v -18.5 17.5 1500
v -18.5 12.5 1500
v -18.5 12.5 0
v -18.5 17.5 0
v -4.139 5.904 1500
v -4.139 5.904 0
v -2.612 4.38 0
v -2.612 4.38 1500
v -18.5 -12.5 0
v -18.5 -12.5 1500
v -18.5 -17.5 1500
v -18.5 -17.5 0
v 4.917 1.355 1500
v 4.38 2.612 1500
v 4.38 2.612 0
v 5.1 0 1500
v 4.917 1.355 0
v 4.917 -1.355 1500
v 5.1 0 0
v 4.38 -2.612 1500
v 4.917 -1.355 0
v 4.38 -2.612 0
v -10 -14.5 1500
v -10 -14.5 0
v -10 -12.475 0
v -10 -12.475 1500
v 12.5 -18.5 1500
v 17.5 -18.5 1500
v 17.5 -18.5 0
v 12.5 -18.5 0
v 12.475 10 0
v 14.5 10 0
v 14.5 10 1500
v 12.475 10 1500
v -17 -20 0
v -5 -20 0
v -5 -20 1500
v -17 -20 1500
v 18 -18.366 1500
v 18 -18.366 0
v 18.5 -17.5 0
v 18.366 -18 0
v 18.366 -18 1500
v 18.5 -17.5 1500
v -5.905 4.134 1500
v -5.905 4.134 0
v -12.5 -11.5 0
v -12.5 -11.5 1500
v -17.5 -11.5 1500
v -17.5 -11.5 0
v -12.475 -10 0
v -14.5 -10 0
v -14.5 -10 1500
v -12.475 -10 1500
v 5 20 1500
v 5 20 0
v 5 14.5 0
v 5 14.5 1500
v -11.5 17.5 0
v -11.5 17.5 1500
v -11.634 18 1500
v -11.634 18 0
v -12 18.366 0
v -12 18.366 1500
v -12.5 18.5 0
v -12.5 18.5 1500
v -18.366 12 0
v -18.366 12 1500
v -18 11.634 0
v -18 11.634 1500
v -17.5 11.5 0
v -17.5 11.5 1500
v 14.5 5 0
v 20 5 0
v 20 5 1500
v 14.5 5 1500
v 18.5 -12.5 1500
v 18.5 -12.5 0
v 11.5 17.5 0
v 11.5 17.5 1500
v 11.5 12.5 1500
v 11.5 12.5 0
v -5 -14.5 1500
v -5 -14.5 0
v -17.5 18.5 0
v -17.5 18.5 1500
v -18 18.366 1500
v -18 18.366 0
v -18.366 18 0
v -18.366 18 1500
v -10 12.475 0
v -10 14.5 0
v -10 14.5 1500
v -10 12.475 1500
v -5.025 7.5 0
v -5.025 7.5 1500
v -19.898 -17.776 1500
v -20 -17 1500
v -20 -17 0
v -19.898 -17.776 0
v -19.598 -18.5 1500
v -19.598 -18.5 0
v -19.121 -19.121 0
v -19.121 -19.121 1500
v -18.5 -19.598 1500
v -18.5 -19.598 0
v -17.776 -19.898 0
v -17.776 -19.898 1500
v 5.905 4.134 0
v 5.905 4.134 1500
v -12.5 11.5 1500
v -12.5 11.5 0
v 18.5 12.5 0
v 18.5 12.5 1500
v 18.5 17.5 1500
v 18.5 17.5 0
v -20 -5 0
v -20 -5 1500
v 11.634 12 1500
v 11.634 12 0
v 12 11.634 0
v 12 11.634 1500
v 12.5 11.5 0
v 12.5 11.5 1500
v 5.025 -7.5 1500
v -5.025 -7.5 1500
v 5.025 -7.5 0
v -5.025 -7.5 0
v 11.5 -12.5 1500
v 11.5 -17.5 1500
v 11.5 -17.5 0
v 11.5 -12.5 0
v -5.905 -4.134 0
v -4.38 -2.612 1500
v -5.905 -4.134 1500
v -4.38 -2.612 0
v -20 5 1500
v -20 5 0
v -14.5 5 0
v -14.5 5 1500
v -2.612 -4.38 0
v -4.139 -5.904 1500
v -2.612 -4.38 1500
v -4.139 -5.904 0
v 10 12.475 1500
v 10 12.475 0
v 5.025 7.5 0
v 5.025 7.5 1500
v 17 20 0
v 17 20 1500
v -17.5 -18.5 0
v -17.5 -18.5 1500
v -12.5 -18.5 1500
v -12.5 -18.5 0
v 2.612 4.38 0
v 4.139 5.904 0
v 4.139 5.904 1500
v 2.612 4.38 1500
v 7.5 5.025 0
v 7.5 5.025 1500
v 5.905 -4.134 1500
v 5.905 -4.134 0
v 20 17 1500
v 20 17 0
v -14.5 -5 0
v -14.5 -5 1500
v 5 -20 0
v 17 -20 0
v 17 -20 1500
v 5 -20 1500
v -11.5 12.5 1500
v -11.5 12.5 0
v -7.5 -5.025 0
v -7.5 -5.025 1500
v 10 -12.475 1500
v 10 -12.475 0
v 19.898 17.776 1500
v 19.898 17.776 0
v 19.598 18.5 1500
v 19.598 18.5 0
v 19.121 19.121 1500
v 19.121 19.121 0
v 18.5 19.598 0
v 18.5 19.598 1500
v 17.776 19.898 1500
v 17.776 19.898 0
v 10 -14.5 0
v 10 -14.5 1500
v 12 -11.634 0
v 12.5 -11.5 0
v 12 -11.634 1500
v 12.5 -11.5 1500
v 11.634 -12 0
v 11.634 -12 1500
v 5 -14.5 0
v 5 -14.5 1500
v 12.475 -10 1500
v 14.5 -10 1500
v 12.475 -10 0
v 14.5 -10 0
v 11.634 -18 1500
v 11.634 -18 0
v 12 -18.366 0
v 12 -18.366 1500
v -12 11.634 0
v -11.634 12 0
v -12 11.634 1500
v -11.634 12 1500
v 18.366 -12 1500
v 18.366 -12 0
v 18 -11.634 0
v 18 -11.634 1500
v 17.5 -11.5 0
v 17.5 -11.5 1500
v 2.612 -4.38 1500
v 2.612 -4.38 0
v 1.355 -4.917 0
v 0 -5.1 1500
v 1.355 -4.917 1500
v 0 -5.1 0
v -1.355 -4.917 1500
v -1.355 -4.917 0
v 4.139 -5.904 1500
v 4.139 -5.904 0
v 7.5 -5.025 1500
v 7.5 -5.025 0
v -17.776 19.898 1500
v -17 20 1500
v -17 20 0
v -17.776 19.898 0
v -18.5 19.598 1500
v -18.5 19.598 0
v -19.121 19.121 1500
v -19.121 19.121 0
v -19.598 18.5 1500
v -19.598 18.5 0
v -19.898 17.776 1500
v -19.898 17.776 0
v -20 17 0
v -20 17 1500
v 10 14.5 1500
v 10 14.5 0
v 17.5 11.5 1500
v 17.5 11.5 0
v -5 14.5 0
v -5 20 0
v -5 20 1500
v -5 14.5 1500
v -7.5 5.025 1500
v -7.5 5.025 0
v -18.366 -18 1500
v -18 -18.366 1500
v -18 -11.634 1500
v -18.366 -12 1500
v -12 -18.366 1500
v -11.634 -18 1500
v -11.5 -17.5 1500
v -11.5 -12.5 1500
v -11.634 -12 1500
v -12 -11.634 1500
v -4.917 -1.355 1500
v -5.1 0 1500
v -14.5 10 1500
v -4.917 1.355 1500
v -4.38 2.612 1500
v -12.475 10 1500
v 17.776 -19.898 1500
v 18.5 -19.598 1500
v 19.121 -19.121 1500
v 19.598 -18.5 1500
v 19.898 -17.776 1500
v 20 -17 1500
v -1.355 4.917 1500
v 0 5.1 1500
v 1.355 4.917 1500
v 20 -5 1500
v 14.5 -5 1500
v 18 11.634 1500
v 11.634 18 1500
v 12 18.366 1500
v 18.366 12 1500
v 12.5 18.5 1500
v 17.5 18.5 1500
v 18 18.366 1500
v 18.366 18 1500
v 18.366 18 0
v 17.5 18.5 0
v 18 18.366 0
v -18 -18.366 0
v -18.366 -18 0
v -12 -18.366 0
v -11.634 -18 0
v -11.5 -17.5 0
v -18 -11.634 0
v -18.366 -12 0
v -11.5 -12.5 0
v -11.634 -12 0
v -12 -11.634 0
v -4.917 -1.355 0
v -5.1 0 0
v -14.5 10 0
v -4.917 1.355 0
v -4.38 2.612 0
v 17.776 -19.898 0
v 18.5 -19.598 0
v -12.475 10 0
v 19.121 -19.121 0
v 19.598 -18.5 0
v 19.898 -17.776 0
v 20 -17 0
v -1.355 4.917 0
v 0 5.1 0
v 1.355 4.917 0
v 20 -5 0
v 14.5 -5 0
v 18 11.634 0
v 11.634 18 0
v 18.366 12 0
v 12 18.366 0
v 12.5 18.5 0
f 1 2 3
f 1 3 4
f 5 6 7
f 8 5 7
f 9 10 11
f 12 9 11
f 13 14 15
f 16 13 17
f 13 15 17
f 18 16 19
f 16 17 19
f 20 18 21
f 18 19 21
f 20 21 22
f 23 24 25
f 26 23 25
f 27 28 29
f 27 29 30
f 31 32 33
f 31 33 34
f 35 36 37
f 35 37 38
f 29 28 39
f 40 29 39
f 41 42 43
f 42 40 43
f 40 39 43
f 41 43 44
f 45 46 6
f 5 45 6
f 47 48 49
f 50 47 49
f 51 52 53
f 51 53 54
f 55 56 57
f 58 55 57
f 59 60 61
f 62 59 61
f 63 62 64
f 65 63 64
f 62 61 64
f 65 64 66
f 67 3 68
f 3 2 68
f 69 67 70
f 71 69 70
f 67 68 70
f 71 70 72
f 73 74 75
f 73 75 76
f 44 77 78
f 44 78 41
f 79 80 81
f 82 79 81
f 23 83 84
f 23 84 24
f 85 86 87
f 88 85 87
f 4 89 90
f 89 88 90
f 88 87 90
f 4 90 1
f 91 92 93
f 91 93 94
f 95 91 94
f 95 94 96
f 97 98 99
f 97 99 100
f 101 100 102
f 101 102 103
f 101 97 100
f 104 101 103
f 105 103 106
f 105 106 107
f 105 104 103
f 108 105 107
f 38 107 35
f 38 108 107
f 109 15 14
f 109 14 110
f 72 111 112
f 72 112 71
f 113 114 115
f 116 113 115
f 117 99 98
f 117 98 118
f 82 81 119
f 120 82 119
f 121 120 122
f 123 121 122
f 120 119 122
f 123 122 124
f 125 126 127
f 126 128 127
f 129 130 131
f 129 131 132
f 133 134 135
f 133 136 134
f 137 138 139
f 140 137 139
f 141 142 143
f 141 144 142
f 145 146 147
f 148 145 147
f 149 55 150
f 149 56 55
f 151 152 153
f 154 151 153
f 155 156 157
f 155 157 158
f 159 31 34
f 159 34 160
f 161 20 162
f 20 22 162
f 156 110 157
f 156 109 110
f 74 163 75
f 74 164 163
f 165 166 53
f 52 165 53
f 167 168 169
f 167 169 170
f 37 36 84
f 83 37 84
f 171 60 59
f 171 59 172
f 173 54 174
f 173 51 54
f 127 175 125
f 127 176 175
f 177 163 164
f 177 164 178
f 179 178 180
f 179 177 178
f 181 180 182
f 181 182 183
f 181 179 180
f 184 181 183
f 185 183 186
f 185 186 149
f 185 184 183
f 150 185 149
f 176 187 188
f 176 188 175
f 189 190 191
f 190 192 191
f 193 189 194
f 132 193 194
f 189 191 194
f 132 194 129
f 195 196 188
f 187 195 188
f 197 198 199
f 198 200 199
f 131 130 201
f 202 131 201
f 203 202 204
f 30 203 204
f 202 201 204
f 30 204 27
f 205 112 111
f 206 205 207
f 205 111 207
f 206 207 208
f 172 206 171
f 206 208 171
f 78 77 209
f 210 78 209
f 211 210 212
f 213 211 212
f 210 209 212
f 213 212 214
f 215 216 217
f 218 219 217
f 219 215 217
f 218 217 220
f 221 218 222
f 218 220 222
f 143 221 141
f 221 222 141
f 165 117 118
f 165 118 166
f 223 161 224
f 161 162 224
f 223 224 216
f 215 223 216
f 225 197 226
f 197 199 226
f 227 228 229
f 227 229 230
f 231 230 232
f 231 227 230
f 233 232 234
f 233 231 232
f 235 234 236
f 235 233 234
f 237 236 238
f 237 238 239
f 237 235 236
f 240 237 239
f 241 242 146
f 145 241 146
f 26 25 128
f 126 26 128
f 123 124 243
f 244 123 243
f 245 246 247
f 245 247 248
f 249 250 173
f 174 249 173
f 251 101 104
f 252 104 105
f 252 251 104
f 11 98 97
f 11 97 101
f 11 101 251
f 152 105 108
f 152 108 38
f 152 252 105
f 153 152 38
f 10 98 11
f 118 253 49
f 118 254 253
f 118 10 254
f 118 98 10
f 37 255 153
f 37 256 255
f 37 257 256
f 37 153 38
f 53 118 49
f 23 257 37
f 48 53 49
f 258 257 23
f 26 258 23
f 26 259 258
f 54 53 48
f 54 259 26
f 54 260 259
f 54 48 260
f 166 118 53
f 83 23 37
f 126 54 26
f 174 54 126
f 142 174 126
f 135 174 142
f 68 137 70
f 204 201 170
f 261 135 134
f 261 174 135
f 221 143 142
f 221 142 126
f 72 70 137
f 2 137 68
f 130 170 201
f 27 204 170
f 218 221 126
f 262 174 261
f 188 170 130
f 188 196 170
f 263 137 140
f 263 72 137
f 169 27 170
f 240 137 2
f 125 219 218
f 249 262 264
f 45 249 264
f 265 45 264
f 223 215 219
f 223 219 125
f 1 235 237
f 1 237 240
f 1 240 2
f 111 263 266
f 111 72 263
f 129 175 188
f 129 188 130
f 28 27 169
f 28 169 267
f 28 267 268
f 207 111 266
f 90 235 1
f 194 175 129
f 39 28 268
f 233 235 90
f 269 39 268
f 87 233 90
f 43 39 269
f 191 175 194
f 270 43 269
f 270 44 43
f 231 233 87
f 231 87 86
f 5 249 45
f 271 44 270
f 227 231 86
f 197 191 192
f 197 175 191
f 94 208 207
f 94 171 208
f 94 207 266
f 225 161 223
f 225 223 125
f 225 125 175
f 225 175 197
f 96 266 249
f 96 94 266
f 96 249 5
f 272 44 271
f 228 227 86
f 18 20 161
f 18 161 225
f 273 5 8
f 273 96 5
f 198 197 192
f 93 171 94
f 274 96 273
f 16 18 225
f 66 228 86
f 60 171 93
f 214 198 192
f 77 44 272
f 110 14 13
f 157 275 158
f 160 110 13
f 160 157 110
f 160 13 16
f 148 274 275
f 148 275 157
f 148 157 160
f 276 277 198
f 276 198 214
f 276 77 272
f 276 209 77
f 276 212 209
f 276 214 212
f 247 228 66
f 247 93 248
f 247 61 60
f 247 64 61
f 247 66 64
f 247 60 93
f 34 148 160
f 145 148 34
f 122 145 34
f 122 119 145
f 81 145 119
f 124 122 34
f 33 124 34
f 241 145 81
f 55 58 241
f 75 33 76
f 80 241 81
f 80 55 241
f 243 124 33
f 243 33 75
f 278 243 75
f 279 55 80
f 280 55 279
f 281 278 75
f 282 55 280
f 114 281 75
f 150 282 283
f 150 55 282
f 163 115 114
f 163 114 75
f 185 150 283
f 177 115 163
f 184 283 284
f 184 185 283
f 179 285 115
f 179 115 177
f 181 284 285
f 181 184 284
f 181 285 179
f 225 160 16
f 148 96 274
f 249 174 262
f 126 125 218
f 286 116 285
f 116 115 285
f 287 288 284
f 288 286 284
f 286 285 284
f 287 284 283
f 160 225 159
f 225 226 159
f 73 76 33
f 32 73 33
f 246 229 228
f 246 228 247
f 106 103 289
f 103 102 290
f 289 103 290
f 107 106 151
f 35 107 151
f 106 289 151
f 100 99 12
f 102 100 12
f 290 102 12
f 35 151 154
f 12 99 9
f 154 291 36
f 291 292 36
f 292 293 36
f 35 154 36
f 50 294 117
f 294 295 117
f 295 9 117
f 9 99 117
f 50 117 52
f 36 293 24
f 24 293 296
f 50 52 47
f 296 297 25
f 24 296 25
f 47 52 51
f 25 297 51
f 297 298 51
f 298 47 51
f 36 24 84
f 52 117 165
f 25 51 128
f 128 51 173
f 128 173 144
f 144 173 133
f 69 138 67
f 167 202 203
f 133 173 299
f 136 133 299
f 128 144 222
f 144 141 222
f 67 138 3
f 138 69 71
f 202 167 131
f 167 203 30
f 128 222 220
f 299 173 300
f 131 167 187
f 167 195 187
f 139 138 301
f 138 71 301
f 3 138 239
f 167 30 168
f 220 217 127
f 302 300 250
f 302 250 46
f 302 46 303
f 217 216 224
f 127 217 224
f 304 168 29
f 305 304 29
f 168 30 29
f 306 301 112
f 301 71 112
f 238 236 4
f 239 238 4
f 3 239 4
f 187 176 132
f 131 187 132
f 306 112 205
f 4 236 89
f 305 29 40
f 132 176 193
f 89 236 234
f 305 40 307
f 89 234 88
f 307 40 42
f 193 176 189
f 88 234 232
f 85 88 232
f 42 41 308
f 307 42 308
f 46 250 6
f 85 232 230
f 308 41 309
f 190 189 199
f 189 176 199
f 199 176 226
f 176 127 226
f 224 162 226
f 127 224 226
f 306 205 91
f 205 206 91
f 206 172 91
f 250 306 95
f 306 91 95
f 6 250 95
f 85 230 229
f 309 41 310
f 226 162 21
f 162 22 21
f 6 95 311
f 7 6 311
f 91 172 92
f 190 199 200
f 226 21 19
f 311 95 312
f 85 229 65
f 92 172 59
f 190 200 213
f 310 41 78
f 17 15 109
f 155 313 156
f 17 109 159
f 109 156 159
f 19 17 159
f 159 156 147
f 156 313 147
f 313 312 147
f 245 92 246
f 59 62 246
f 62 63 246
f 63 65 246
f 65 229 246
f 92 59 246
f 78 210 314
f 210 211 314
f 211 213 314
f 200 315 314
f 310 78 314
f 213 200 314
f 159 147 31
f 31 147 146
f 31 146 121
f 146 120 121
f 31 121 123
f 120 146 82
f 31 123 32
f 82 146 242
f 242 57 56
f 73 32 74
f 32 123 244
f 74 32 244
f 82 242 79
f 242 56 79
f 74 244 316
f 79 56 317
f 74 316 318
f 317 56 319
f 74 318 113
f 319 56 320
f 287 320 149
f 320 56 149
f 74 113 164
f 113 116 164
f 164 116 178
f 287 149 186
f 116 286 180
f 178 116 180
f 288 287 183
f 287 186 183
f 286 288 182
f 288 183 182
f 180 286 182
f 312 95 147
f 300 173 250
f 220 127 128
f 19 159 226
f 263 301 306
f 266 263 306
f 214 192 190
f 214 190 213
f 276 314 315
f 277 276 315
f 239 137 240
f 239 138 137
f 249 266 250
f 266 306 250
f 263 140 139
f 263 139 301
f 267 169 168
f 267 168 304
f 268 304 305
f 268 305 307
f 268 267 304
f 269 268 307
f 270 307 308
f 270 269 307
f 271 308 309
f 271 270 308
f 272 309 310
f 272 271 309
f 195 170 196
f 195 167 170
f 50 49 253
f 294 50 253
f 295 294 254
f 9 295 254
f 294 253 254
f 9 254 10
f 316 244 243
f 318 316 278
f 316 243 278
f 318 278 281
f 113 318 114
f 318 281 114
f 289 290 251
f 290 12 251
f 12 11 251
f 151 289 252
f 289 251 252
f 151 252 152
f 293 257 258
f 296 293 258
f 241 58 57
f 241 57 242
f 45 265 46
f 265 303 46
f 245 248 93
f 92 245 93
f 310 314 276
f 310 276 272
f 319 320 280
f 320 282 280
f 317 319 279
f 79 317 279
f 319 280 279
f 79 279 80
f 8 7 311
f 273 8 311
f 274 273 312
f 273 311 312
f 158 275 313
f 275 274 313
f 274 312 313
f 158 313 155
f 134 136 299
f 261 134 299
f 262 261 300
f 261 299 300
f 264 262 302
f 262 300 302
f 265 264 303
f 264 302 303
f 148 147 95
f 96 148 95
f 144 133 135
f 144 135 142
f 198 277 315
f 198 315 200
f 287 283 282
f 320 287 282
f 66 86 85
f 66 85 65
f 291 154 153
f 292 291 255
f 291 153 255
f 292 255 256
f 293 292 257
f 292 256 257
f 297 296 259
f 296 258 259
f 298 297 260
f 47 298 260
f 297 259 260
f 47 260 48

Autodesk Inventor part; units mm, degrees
ref_plane "YZ Plane" through (0, 0, 0) normal (1, 0, 0) x (0, 1, 0)
ref_plane "XZ Plane" through (0, 0, 0) normal (0, 1, 0) x (-1, 0, 0)
ref_plane "XY Plane" through (0, 0, 0) normal (0, 0, 1) x (1, 0, 0)
sketch "T-Slot 4040 Base" plane through (0, 0, 0) normal (0, 0, 1) x (1, 0, 0)
  line L0 (-28, 0) -> (28, 0) construction
  line L1 (0, -28) -> (0, 28) construction
  circle A0 centre (0, 0) radius 5.1
  line L2 (-7.5, -7.5) -> (7.5, -7.5)
  line L3 (7.5, -7.5) -> (7.5, 7.5)
  line L4 (7.5, 7.5) -> (-7.5, 7.5)
  line L5 (-7.5, 7.5) -> (-7.5, -7.5)
  line L6 (-7.5, -7.5) -> (7.5, 7.5) construction
  line L7 (7.5, -7.5) -> (-7.5, 7.5) construction
  line L8 (-20, 20) -> (20, 20)
  line L9 (20, 20) -> (20, -20)
  line L10 (20, -20) -> (-20, -20)
  line L11 (-20, -20) -> (-20, 20)
  line L12 (-20, 20) -> (20, -20) construction
  line L13 (20, 20) -> (-20, -20) construction
  line L14 (20, 5) -> (14.5, 5)
  line L15 (14.5, 5) -> (14.5, 10)
  line L16 (14.5, 10) -> (12.4749, 10)
  line L17 (12.4749, 10) -> (7.5, 5.0251)
  line L18 (5, 20) -> (5, 14.5)
  line L19 (5, 14.5) -> (10, 14.5)
  line L20 (10, 14.5) -> (10, 12.4749)
  line L21 (10, 12.4749) -> (5.0251, 7.5)
  line L22 (18.5, 18.5) -> (11.5, 18.5)
  line L23 (11.5, 18.5) -> (11.5, 11.5)
  line L24 (11.5, 11.5) -> (18.5, 11.5)
  line L25 (18.5, 11.5) -> (18.5, 18.5)
  line L26 (18.5, 18.5) -> (11.5, 11.5) construction
  line L27 (11.5, 18.5) -> (18.5, 11.5) construction
  line L28 (3.0732, 1.3088) -> (4.38, 2.6125) construction
  line L29 (5.905, 4.1338) -> (4.1393, 5.9037)
  line L30 (4.1393, 5.9037) -> (2.6122, 4.3802)
  line L31 (1.3075, 3.0787) -> (3.0732, 1.3088) construction
  line L32 (3.0732, 1.3088) -> (4.1393, 5.9037) construction
  line L33 (5.905, 4.1338) -> (1.3075, 3.0787) construction
  line L34 (4.38, 2.6125) -> (5.905, 4.1338)
  line L35 (2.6122, 4.3802) -> (1.3075, 3.0787) construction
  line L36 (-20, 5) -> (-14.5, 5)
  line L37 (-14.5, 5) -> (-14.5, 10)
  line L38 (-14.5, 10) -> (-12.4749, 10)
  line L39 (-12.4749, 10) -> (-7.5, 5.0251)
  line L40 (-5, 20) -> (-5, 14.5)
  line L41 (-5, 14.5) -> (-10, 14.5)
  line L42 (-10, 14.5) -> (-10, 12.4749)
  line L43 (-10, 12.4749) -> (-5.0251, 7.5)
  line L44 (-18.5, 18.5) -> (-11.5, 18.5)
  line L45 (-11.5, 18.5) -> (-11.5, 11.5)
  line L46 (-11.5, 11.5) -> (-18.5, 11.5)
  line L47 (-18.5, 11.5) -> (-18.5, 18.5)
  line L48 (-5.905, 4.1338) -> (-4.1393, 5.9037)
  line L49 (-4.1393, 5.9037) -> (-2.6122, 4.3802)
  line L50 (-4.38, 2.6125) -> (-5.905, 4.1338)
  line L51 (7.5, -7.5) -> (-7.5, -7.5)
  line L52 (20, -5) -> (14.5, -5)
  line L53 (14.5, -5) -> (14.5, -10)
  line L54 (14.5, -10) -> (12.4749, -10)
  line L55 (12.4749, -10) -> (7.5, -5.0251)
  line L56 (5, -20) -> (5, -14.5)
  line L57 (5, -14.5) -> (10, -14.5)
  line L58 (10, -14.5) -> (10, -12.4749)
  line L59 (10, -12.4749) -> (5.0251, -7.5)
  line L60 (18.5, -18.5) -> (11.5, -18.5)
  line L61 (11.5, -18.5) -> (11.5, -11.5)
  line L62 (11.5, -11.5) -> (18.5, -11.5)
  line L63 (18.5, -11.5) -> (18.5, -18.5)
  line L64 (18.5, -18.5) -> (11.5, -11.5) construction
  line L65 (11.5, -18.5) -> (18.5, -11.5) construction
  line L66 (3.0732, -1.3088) -> (4.38, -2.6125) construction
  line L67 (5.905, -4.1338) -> (4.1393, -5.9037)
  line L68 (4.1393, -5.9037) -> (2.6122, -4.3802)
  line L69 (1.3075, -3.0787) -> (3.0732, -1.3088) construction
  line L70 (3.0732, -1.3088) -> (4.1393, -5.9037) construction
  line L71 (5.905, -4.1338) -> (1.3075, -3.0787) construction
  line L72 (4.38, -2.6125) -> (5.905, -4.1338)
  line L73 (2.6122, -4.3802) -> (1.3075, -3.0787) construction
  line L74 (-4.38, -2.6125) -> (-5.905, -4.1338)
  line L75 (-4.1393, -5.9037) -> (-2.6122, -4.3802)
  line L76 (-5.905, -4.1338) -> (-4.1393, -5.9037)
  line L77 (-12.4749, -10) -> (-7.5, -5.0251)
  line L78 (-10, -12.4749) -> (-5.0251, -7.5)
  line L79 (-10, -14.5) -> (-10, -12.4749)
  line L80 (-5, -14.5) -> (-10, -14.5)
  line L81 (-5, -20) -> (-5, -14.5)
  line L82 (-18.5, -18.5) -> (-11.5, -18.5)
  line L83 (-11.5, -18.5) -> (-11.5, -11.5)
  line L84 (-11.5, -11.5) -> (-18.5, -11.5)
  line L85 (-18.5, -11.5) -> (-18.5, -18.5)
  line L86 (-14.5, -10) -> (-12.4749, -10)
  line L87 (-14.5, -5) -> (-14.5, -10)
  line L88 (-20, -5) -> (-14.5, -5)
  point P0 (15, 15)
  point P1 (3.6062, 3.6062)
  point P2 (3.6062, 3.6062)
  point P3 (15, -15)
  point P4 (3.6062, -3.6062)
  point P5 (3.6062, -3.6062)
  dimension "d9" = 10.2
  dimension "d12" = 40
  dimension "d13" = 40
  dimension "d14" = 5.5
  dimension "d15" = 15
  dimension "d16" = 7
  dimension "d17" = 10
  dimension "d20" = 1.75
  dimension "d21" = 7
  dimension "d22" = 2
  dimension "d29" = 1.5
  dimension "d30" = 2.5
extrude "Extrusion1" add sketch "T-Slot 4040 Base" along normal blind 1500 contours L5 L4 L3 L2 | L2 L78 L79 L80 L81 L10 L11 L88 L87 L86 L77 L5 | L2 L3 L55 L54 L53 L52 L9 L10 L56 L57 L58 L59 | L39 L38 L37 L36 L11 L8 L40 L41 L42 L43 L4 L5 | L3 L4 L21 L20 L19 L18 L8 L9 L14 L15 L16 L17
fillet "Rundung1" radius 1 16 edges at (11.5, 18.5, 750) (18.5, 18.5, 750) (18.5, 11.5, 750) (11.5, 11.5, 750) (-11.5, 18.5, 750) (-18.5, 18.5, 750) (-18.5, 11.5, 750) (-11.5, 11.5, 750) (-18.5, -11.5, 750) (-11.5, -11.5, 750) (-11.5, -18.5, 750) (-18.5, -18.5, 750) (11.5, -18.5, 750) (11.5, -11.5, 750) (18.5, -11.5, 750) (18.5, -18.5, 750)
fillet "Rundung2" radius 3 4 edges at (20, 20, 750) (20, -20, 750) (-20, -20, 750) (-20, 20, 750)
properties part number "T-SLOT 4040 B-Type 1500mm"
